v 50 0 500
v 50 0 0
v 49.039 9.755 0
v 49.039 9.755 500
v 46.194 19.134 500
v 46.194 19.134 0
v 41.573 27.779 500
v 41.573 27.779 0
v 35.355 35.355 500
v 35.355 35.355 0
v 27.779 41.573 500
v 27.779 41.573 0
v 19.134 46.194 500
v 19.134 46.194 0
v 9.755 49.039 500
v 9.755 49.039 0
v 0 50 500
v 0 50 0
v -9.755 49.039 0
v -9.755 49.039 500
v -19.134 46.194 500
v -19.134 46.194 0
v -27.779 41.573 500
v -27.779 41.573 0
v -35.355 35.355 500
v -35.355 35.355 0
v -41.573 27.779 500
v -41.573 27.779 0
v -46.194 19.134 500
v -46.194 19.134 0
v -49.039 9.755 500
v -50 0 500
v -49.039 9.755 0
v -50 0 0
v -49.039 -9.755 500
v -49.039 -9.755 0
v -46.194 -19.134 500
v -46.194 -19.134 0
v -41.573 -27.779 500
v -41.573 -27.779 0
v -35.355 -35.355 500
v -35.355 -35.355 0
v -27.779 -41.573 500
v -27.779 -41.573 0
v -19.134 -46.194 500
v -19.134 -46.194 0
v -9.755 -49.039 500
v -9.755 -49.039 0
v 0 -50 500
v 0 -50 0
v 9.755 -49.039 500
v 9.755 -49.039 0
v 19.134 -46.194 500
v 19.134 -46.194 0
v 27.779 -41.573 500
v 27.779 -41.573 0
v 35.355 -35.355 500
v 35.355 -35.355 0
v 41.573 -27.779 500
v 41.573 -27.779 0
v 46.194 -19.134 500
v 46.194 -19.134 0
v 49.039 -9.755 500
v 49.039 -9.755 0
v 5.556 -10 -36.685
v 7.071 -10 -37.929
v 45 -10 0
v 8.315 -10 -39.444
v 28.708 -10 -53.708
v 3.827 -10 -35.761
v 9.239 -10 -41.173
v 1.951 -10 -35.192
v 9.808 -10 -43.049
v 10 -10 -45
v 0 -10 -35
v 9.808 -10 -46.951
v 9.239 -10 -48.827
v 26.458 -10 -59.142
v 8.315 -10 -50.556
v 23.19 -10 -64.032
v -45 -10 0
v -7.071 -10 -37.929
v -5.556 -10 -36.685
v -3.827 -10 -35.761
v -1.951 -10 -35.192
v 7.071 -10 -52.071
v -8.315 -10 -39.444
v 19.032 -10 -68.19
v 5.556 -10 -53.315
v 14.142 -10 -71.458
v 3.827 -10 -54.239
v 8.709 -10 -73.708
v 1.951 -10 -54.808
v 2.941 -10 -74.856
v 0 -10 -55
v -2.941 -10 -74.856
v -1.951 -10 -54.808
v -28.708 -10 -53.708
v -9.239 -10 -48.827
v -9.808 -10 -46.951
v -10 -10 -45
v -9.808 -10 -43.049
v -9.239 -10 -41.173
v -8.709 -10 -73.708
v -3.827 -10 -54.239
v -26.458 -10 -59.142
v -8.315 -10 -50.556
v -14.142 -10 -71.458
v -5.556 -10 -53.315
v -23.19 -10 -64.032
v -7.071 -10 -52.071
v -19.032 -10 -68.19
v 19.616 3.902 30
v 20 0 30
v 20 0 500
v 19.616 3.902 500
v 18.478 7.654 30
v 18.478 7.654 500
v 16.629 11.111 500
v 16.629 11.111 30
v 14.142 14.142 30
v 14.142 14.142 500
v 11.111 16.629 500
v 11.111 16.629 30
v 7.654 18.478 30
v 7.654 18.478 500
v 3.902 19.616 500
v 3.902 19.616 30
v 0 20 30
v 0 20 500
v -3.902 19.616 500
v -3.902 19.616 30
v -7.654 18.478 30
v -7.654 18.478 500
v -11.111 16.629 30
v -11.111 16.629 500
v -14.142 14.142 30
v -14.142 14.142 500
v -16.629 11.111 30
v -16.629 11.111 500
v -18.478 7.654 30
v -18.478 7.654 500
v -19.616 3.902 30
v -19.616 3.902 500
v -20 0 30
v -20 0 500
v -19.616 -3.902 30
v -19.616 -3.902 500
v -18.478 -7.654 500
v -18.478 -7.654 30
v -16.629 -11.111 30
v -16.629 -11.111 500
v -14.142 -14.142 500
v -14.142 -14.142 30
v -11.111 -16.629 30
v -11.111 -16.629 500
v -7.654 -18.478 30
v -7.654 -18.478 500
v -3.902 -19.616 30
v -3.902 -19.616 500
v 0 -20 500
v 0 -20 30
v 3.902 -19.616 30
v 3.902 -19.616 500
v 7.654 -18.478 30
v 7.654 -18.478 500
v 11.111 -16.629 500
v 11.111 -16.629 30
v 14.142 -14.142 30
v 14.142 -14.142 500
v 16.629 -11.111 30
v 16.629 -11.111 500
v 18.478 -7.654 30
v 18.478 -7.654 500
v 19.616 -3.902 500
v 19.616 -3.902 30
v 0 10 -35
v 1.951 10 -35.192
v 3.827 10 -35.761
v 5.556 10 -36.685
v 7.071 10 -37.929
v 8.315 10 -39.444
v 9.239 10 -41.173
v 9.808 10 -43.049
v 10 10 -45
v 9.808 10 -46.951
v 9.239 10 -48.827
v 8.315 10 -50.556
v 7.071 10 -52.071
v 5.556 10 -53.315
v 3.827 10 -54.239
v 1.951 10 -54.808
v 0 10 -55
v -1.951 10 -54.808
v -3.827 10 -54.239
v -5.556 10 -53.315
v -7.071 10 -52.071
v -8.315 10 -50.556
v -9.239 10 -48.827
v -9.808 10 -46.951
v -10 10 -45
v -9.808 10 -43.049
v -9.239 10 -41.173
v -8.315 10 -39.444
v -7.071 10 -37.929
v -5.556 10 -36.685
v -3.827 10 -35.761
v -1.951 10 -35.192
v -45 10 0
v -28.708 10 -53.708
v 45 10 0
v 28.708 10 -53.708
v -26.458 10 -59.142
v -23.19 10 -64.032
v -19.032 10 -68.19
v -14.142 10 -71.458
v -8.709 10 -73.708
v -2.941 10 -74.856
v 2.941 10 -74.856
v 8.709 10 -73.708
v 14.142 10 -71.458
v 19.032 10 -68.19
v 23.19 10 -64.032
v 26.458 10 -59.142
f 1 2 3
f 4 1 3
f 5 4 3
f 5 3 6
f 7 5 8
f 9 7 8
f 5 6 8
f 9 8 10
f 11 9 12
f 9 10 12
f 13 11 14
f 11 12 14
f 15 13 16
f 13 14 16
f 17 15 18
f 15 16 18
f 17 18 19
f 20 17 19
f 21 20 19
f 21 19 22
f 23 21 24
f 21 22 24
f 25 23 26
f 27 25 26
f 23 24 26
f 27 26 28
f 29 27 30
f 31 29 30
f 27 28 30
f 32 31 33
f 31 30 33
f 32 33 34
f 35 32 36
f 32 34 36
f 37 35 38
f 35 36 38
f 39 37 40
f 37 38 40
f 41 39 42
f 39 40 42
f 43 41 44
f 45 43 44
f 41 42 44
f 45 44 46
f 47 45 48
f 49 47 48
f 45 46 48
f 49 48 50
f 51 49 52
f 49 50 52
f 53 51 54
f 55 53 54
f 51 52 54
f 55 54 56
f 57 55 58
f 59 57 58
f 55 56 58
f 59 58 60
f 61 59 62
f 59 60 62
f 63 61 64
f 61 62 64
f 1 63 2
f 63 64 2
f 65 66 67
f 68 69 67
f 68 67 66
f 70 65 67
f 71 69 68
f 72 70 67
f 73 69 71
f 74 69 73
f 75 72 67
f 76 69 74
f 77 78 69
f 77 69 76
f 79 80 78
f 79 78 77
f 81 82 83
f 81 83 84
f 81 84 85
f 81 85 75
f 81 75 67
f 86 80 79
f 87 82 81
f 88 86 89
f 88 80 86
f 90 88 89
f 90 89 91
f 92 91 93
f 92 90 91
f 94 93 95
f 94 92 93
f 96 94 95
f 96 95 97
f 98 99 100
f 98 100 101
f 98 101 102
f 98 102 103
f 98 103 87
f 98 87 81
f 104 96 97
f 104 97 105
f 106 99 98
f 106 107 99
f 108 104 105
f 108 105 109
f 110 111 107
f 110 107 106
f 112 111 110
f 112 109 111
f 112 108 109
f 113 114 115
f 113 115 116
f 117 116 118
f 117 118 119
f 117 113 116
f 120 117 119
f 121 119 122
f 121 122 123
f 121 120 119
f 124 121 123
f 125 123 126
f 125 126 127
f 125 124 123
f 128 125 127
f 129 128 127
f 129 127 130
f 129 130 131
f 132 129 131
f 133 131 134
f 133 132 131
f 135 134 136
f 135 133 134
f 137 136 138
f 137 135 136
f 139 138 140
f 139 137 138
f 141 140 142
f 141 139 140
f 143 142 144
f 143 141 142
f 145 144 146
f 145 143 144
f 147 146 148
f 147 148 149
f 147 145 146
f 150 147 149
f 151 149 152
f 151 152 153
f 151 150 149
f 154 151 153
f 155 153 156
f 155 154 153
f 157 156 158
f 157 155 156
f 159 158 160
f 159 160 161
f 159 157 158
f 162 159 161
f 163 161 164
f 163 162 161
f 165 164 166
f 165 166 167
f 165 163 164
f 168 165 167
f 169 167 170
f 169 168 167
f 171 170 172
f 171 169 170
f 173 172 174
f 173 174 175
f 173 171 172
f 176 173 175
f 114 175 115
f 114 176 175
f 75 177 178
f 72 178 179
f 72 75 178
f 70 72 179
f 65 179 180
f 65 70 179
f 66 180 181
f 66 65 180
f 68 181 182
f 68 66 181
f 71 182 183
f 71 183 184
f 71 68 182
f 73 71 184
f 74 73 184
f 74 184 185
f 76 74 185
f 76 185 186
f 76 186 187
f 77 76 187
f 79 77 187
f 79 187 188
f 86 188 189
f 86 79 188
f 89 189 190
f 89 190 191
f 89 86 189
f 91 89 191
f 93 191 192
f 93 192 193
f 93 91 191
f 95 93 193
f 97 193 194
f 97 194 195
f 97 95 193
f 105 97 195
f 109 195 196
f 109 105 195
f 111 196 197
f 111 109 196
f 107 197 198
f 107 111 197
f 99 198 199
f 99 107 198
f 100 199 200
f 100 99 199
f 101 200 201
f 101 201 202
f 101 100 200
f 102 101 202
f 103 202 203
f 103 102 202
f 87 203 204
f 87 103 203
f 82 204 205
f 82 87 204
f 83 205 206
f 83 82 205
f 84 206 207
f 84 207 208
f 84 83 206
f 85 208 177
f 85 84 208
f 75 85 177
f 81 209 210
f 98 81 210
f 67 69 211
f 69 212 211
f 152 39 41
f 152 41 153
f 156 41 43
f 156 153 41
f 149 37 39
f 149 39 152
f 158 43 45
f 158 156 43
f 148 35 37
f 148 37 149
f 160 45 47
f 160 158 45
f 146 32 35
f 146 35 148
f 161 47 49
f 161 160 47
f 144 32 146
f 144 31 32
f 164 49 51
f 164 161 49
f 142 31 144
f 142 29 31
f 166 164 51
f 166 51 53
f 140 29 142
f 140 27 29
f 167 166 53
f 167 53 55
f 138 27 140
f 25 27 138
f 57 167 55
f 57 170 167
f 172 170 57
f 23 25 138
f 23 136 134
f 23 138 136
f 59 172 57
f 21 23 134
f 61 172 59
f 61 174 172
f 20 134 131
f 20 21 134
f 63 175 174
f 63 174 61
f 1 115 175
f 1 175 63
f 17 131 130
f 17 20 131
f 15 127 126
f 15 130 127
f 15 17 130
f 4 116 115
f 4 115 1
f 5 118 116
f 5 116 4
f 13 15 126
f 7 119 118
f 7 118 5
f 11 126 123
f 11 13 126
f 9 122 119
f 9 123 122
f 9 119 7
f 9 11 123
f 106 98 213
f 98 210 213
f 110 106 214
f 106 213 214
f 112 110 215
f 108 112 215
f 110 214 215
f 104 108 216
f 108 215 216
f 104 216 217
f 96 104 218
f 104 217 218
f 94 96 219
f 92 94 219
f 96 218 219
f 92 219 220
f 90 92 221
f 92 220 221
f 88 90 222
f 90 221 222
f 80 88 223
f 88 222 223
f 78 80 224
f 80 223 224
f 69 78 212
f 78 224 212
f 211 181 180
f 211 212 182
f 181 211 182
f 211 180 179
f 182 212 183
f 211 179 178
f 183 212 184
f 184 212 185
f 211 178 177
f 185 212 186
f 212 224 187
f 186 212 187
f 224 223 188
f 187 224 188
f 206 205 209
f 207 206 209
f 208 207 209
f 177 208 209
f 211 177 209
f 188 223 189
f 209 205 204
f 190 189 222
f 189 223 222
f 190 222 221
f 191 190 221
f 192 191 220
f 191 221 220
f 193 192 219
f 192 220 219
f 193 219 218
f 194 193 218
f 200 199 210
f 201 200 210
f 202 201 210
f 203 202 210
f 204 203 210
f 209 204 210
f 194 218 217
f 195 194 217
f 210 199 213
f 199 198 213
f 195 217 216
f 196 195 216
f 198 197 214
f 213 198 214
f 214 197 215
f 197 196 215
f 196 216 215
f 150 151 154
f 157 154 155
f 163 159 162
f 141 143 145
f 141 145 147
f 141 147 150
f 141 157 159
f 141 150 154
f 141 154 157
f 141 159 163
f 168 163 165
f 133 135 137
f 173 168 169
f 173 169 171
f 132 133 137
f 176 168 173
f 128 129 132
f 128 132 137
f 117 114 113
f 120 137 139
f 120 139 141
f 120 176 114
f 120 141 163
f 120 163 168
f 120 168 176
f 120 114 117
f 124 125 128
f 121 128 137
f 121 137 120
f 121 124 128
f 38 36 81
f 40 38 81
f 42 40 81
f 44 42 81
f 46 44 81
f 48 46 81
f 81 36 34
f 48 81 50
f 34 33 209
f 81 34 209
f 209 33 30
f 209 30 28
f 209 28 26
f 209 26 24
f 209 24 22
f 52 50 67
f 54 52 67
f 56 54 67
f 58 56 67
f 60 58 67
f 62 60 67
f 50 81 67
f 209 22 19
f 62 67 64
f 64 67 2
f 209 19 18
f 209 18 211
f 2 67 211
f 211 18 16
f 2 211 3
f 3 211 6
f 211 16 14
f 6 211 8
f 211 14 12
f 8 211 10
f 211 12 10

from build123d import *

# Parameters (mm, degrees)
SKETCH1_R           = 50
BOSS_EXTRUDE1_DEPTH = 500
SKETCH2_R           = 10
BOSS_EXTRUDE2_DEPTH = 10
SHELL1_START        = 30
SHELL1_OUTLINE_R    = 20
SHELL1_DEPTH        = 470


# Read off the part's stored shape, not the designer's step: Shell1
with BuildPart() as part:
    # Sketch1 → Boss-Extrude1 (new body)
    with BuildSketch(Plane.XY):
        Circle(SKETCH1_R)
    extrude(amount=BOSS_EXTRUDE1_DEPTH)

    # Sketch2 → Boss-Extrude2 (add, symmetric)
    with BuildSketch(Plane(origin=(0, 0, 0), x_dir=(1, 0, 0), z_dir=(0, 1, 0))):
        with BuildLine():
            Line((-45, 0), (-28.708286934, 53.708286934))
            ThreePointArc((-28.708286934, 53.708286934), (0, 75), (28.708286934, 53.708286934))
            Line((28.708286934, 53.708286934), (45, 0))
            Line((45, 0), (-45, 0))
        make_face()
        with Locations(Location((0, 45, 0), (0, 0, 270))):
            Circle(SKETCH2_R, mode=Mode.SUBTRACT)
    extrude(amount=BOSS_EXTRUDE2_DEPTH, both=True)

    # Shell1 outline → Shell1 (cut)
    with BuildSketch(Plane.XY.offset(SHELL1_START)):
        Circle(SHELL1_OUTLINE_R)
    extrude(amount=SHELL1_DEPTH, mode=Mode.SUBTRACT)


solid = part.part
